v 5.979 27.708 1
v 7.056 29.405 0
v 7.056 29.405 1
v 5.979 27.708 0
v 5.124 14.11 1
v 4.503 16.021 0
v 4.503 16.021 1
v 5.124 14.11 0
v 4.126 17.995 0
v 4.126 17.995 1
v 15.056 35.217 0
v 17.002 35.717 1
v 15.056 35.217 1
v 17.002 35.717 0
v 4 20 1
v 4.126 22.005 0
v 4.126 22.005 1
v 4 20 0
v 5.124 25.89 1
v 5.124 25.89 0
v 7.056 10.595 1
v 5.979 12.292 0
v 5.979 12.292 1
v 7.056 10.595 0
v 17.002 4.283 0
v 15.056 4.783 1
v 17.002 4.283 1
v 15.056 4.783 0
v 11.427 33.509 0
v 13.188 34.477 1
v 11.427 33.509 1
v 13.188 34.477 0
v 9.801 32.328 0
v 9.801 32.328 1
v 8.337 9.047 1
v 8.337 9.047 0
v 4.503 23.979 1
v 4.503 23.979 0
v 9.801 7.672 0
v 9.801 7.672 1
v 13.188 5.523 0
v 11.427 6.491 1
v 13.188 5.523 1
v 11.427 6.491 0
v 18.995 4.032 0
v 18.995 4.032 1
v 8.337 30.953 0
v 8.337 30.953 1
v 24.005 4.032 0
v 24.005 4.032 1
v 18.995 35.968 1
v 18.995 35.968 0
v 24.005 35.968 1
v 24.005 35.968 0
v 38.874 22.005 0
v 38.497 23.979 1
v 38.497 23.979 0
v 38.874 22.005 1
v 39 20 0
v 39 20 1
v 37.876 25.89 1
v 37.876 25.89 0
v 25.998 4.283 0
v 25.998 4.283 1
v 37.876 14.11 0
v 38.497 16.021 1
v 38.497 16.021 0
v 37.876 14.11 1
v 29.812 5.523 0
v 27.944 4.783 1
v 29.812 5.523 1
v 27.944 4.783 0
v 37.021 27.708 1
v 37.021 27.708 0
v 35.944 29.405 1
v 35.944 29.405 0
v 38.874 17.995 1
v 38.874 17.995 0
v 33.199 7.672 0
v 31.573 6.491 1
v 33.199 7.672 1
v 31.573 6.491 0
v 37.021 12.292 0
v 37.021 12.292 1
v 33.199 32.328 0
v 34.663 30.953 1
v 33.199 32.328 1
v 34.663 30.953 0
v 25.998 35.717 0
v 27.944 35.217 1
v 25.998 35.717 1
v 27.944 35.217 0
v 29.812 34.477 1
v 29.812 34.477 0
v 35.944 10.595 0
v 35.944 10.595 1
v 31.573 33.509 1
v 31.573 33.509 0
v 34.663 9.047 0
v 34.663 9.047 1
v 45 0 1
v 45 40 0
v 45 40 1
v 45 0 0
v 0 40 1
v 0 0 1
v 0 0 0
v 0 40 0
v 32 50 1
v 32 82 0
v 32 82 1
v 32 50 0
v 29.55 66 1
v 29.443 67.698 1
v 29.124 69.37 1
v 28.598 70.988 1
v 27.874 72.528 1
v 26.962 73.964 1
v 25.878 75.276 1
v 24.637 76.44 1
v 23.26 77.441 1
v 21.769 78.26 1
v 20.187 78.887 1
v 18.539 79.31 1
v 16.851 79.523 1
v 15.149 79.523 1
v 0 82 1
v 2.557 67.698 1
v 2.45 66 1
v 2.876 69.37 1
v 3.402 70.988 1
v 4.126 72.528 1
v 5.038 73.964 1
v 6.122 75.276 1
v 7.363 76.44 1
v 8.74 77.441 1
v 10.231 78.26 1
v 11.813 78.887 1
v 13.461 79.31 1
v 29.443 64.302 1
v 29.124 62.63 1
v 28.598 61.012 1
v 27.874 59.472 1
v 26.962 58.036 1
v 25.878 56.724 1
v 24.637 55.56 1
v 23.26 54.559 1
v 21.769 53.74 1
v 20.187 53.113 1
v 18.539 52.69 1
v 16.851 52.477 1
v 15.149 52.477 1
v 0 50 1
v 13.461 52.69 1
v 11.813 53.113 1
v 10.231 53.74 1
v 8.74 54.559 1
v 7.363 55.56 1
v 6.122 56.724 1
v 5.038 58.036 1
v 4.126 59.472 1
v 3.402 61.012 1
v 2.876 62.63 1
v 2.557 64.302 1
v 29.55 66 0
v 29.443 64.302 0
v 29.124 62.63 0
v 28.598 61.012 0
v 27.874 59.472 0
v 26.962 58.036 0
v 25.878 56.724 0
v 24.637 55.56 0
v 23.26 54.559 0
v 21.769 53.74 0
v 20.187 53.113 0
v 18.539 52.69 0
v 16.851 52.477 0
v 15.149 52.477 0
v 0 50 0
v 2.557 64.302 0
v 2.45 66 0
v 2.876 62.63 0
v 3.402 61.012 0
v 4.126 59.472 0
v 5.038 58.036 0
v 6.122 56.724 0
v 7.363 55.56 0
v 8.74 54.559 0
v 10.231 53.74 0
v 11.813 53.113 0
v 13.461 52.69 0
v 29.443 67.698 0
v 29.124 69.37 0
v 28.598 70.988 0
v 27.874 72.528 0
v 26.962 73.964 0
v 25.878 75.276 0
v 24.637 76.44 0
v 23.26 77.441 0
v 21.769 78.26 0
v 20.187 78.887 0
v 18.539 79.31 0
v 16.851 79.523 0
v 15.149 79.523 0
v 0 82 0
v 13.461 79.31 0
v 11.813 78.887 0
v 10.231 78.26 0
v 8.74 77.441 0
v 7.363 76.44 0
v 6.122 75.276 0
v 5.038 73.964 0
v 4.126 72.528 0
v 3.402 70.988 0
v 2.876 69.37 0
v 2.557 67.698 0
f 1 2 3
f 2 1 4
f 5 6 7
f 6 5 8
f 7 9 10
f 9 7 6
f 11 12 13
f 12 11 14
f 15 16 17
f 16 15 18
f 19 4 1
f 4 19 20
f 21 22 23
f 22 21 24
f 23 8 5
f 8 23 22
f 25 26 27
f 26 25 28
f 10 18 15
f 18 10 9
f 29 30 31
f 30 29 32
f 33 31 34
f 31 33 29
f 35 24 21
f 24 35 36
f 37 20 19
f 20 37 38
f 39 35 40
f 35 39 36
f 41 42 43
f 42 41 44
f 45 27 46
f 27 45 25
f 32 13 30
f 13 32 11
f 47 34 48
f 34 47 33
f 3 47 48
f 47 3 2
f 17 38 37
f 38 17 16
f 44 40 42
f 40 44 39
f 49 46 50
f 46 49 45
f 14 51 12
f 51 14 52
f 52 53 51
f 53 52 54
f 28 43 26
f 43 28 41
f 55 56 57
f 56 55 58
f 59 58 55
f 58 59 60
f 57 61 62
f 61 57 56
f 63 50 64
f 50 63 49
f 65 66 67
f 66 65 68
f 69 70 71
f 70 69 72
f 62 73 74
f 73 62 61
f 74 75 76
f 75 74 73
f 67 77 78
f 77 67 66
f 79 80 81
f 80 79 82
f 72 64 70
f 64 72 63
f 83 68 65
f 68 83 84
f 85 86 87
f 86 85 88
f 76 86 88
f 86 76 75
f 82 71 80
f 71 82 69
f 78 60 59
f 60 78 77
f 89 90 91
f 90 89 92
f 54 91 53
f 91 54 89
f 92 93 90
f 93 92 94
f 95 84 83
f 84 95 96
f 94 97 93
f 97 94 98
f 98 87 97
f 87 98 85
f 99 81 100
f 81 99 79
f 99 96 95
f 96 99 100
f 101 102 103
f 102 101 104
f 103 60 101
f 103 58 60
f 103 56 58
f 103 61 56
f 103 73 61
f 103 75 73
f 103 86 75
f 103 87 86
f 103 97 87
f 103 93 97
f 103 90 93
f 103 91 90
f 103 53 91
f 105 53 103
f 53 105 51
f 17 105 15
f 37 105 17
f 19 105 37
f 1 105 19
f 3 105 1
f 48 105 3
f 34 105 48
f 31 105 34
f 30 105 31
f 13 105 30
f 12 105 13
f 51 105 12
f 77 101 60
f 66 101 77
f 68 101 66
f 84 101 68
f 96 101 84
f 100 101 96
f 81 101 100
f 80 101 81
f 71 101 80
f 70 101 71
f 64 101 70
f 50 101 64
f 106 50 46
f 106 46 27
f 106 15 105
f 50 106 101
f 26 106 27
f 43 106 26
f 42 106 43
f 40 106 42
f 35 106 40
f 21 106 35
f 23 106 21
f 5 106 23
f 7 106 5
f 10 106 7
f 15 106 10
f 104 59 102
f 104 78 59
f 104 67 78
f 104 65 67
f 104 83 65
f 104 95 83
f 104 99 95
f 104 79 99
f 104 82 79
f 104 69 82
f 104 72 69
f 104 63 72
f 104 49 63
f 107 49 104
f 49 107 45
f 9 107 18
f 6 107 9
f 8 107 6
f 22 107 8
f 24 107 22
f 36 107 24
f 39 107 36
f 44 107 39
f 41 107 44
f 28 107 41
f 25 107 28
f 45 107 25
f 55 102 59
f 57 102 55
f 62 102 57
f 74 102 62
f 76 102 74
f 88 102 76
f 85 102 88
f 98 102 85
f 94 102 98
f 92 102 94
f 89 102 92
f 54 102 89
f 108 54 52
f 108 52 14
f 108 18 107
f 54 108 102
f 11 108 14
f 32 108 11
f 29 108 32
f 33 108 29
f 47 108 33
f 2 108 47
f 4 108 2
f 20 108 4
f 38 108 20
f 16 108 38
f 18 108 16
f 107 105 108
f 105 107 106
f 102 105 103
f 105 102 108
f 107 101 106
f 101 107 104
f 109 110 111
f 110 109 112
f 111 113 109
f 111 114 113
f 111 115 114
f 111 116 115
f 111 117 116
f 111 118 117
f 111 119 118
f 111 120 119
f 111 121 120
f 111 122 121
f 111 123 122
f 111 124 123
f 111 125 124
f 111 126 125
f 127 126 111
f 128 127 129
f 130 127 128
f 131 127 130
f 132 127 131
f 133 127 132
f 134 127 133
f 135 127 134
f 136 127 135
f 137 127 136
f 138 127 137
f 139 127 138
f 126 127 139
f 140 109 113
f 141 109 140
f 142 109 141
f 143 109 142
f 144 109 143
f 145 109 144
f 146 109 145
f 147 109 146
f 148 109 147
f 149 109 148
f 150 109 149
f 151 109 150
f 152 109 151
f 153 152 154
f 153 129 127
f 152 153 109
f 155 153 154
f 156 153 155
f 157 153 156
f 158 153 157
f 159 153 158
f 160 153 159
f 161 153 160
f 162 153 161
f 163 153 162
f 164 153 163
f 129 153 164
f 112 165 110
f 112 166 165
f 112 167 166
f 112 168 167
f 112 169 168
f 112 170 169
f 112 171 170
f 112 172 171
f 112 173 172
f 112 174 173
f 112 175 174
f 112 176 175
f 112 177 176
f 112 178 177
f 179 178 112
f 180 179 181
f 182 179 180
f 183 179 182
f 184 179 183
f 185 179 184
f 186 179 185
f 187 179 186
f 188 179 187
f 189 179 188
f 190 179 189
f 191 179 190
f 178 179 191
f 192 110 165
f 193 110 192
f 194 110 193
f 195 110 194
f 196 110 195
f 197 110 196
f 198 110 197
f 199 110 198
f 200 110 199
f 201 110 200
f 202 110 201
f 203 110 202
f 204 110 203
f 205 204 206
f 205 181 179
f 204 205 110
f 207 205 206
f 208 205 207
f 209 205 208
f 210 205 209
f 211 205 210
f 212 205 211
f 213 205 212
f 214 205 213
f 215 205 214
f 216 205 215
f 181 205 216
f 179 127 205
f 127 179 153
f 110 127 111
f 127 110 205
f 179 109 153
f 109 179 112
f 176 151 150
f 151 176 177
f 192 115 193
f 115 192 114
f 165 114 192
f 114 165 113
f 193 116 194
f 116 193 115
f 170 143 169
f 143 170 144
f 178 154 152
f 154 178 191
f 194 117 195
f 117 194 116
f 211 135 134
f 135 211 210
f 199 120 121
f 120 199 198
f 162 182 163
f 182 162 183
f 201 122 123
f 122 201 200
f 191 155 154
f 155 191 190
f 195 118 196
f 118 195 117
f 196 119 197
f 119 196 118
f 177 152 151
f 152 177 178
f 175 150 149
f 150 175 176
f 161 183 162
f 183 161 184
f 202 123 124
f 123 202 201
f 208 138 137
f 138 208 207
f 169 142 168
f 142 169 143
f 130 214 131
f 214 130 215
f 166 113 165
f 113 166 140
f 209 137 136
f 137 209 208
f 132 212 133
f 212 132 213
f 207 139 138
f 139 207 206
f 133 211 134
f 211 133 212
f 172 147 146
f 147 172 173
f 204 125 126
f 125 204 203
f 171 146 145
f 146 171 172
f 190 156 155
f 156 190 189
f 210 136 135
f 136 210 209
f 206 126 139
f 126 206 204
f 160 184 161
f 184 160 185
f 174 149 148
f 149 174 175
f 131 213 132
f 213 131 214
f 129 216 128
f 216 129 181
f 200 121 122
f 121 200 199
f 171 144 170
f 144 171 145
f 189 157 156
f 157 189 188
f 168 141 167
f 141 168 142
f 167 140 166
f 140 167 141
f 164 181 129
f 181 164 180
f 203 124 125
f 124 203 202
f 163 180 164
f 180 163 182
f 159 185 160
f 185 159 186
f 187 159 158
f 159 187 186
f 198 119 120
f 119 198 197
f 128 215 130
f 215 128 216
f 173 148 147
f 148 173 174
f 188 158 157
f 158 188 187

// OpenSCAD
stem_w = 35;
stem_d = 32;

seat_d = 27.1;

difference() {
  cube(size = [45, 40, 1]);
  for(i = [0 : 3]) {
    translate(v=[20 + i,20,-1]) {
      cylinder(h = 4, r = (stem_d / 2), $fn = 50);
    }
  }
}

translate(v=[0, 50, 0]) {
  difference() {
    cube(size = [32, 32, 1]);
    translate(v=[16, 16,-1]) {
      cylinder(h = 4, r = (seat_d / 2), $fn = 50);
    }
  }
}
